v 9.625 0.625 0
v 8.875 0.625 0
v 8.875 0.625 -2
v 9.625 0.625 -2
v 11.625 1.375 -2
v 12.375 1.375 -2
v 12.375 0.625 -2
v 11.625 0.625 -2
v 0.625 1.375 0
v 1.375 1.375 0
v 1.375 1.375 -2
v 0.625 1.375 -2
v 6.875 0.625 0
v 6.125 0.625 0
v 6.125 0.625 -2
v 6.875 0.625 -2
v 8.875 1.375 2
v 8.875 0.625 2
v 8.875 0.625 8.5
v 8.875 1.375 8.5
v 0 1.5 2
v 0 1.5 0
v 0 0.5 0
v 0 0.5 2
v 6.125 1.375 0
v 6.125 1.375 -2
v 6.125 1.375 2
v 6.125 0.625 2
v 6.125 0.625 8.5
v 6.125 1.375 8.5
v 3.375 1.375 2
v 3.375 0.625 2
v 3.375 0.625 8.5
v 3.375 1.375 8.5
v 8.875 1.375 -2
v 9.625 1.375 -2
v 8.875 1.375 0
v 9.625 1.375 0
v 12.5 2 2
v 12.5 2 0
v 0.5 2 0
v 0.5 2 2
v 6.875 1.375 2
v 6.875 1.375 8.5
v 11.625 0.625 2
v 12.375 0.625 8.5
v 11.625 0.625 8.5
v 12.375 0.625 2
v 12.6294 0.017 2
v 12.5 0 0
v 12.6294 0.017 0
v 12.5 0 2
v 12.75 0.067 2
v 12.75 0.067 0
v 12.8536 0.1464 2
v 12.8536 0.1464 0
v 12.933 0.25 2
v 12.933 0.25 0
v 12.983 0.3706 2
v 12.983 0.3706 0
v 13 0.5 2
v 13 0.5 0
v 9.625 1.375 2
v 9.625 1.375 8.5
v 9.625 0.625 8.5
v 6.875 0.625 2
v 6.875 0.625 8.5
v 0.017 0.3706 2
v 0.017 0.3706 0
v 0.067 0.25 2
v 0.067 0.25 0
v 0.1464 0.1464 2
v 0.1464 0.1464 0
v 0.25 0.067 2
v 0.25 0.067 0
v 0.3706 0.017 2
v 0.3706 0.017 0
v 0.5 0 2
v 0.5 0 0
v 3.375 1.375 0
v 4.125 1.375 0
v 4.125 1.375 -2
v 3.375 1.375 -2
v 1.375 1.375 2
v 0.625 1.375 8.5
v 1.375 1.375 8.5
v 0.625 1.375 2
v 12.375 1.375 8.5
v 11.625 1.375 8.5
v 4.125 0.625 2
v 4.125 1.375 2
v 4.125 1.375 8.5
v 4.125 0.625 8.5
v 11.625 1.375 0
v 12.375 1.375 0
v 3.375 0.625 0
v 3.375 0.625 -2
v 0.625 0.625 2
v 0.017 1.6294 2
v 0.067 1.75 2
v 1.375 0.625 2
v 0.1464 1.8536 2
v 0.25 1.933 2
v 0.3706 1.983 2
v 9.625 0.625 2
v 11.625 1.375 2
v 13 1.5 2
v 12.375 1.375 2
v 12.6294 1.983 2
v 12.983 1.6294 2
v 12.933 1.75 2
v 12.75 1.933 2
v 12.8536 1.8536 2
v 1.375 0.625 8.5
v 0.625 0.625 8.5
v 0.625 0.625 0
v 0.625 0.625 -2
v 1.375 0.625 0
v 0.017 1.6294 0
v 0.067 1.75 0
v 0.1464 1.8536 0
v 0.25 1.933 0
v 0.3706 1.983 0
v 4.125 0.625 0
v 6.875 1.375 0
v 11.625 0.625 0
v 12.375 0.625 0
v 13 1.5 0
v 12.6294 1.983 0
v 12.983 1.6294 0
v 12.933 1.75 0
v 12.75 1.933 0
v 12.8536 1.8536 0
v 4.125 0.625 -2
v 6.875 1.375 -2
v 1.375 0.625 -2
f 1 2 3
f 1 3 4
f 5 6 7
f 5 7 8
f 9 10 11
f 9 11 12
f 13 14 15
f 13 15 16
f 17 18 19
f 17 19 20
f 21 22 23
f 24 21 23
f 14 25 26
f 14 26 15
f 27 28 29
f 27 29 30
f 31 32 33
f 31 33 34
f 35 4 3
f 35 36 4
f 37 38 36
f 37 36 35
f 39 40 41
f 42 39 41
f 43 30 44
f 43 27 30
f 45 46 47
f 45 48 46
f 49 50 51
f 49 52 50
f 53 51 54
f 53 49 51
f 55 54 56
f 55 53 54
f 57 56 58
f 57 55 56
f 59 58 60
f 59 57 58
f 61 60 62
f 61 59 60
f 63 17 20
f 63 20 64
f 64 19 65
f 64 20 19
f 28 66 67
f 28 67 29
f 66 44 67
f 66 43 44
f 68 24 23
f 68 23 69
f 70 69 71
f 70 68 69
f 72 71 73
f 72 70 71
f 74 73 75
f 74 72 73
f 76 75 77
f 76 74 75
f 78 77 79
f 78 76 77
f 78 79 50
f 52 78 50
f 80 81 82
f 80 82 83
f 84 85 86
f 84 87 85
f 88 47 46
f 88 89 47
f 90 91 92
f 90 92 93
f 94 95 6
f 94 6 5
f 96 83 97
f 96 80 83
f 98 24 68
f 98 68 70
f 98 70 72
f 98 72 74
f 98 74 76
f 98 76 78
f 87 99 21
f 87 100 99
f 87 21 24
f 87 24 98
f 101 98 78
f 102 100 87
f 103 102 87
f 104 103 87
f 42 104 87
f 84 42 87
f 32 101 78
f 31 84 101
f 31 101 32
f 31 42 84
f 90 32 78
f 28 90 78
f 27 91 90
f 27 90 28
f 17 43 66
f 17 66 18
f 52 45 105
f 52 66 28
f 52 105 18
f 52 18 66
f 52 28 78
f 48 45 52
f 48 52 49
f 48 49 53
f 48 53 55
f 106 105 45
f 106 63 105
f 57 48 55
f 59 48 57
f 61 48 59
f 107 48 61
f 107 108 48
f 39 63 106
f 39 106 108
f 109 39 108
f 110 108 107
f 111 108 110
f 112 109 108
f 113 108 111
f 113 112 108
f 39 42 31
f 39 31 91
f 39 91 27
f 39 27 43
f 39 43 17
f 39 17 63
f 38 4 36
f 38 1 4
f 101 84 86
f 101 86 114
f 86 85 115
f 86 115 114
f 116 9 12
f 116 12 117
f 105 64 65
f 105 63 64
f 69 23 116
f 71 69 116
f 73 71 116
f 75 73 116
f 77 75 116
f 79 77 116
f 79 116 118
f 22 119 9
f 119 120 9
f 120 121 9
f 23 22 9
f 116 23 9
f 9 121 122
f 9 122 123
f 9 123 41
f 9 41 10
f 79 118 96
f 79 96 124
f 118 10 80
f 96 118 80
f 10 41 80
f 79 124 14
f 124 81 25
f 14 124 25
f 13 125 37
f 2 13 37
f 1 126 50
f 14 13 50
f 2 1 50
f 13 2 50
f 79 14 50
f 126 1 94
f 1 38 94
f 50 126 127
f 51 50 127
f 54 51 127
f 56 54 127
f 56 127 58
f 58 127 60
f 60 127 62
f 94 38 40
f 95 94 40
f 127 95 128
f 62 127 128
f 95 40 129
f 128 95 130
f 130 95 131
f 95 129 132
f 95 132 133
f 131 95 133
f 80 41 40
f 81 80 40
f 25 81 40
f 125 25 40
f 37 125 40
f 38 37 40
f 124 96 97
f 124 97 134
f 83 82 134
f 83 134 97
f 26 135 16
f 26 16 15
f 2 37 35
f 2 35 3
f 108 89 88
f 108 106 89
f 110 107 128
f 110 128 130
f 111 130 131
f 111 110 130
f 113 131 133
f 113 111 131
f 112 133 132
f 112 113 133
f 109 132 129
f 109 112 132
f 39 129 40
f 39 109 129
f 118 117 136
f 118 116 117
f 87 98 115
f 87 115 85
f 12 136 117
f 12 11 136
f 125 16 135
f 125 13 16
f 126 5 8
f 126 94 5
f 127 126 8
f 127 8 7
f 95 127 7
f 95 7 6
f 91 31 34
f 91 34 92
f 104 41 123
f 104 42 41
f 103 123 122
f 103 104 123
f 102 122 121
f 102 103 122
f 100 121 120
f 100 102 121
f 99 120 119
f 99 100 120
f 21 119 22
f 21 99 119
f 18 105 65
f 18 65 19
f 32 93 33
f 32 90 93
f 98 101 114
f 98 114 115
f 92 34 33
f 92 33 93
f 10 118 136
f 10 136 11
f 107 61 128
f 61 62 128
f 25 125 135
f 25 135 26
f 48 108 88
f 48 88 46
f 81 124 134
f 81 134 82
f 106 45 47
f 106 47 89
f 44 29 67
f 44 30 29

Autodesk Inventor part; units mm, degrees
ref_plane "YZ Plane" through (0, 0, 0) normal (1, 0, 0) x (0, 1, 0)
ref_plane "XZ Plane" through (0, 0, 0) normal (0, 1, 0) x (-1, 0, 0)
ref_plane "XY Plane" through (0, 0, 0) normal (0, 0, 1) x (1, 0, 0)
sketch "Skizze1" plane through (0, 0, 0) normal (0, 0, 1) x (1, 0, 0)
  line L0 (0, 0) -> (13, 0)
  line L1 (13, 0) -> (13, 2)
  line L2 (13, 2) -> (0, 2)
  line L3 (0, 2) -> (0, 0)
  dimension "d0" = 13
  dimension "d1" = 2
extrude "Extrusion1" add sketch "Skizze1" along normal blind 2
sketch "Skizze2" plane through (0, 0, 2) normal (0, 0, 1) x (1, 0, 0)
  line L0 (6.125, 1.375) -> (6.875, 1.375)
  line L1 (6.875, 1.375) -> (6.875, 0.625)
  line L2 (6.875, 0.625) -> (6.125, 0.625)
  line L3 (6.125, 0.625) -> (6.125, 1.375)
  line L4 (13, 2) -> (0, 2) construction
  line L5 (6.5, 2) -> (6.5, 0) construction
  line L6 (0, 0) -> (13, 0) construction
  line L7 (0, 2) -> (0, 0) construction
  line L8 (0, 1) -> (13, 1) construction
  line L9 (13, 0) -> (13, 2) construction
  line L10 (8.875, 1.375) -> (9.625, 1.375)
  line L11 (8.875, 0.625) -> (8.875, 1.375)
  line L12 (9.625, 0.625) -> (8.875, 0.625)
  line L13 (9.625, 1.375) -> (9.625, 0.625)
  line L14 (11.625, 1.375) -> (12.375, 1.375)
  line L15 (11.625, 0.625) -> (11.625, 1.375)
  line L16 (12.375, 0.625) -> (11.625, 0.625)
  line L17 (12.375, 1.375) -> (12.375, 0.625)
  line L18 (3.375, 1.375) -> (4.125, 1.375)
  line L19 (3.375, 0.625) -> (3.375, 1.375)
  line L20 (4.125, 0.625) -> (3.375, 0.625)
  line L21 (4.125, 1.375) -> (4.125, 0.625)
  line L22 (6.125, 1.375) -> (6.875, 1.375)
  line L23 (6.125, 0.625) -> (6.125, 1.375)
  line L24 (6.875, 0.625) -> (6.125, 0.625)
  line L25 (6.875, 1.375) -> (6.875, 0.625)
  line L26 (8.875, 1.375) -> (9.625, 1.375)
  line L27 (8.875, 0.625) -> (8.875, 1.375)
  line L28 (9.625, 0.625) -> (8.875, 0.625)
  line L29 (9.625, 1.375) -> (9.625, 0.625)
  line L30 (0.625, 1.375) -> (1.375, 1.375)
  line L31 (0.625, 0.625) -> (0.625, 1.375)
  line L32 (1.375, 0.625) -> (0.625, 0.625)
  line L33 (1.375, 1.375) -> (1.375, 0.625)
  line L34 (3.375, 1.375) -> (4.125, 1.375)
  line L35 (3.375, 0.625) -> (3.375, 1.375)
  line L36 (4.125, 0.625) -> (3.375, 0.625)
  line L37 (4.125, 1.375) -> (4.125, 0.625)
  line L38 (6.125, 1.375) -> (6.875, 1.375)
  line L39 (6.125, 0.625) -> (6.125, 1.375)
  line L40 (6.875, 0.625) -> (6.125, 0.625)
  line L41 (6.875, 1.375) -> (6.875, 0.625)
  point P0 (6.5, 1.375)
  point P1 (6.125, 1)
  point P2 (9.25, 1.375)
  point P3 (8.875, 1)
  point P4 (12, 1.375)
  point P5 (11.625, 1)
  point P6 (3.75, 1.375)
  point P7 (3.375, 1)
  point P8 (6.5, 1.375)
  point P9 (6.125, 1)
  point P10 (9.25, 1.375)
  point P11 (8.875, 1)
  point P12 (1, 1.375)
  point P13 (0.625, 1)
  point P14 (3.75, 1.375)
  point P15 (3.375, 1)
  point P16 (6.5, 1.375)
  point P17 (6.125, 1)
  dimension "d4" = 0.75
  dimension "d7" = 2.75
  dimension "d10" = 2.75
extrude "Extrusion2" add sketch "Skizze2" along normal blind 6.5
sketch "Skizze3" plane through (0, 0, 0) normal (0, 0, -1) x (-1, 0, 0)
  line L0 (-1.375, 1.375) -> (-0.625, 1.375) projected
  line L1 (-0.625, 1.375) -> (-0.625, 0.625) projected
  line L2 (-0.625, 0.625) -> (-1.375, 0.625) projected
  line L3 (-1.375, 0.625) -> (-1.375, 1.375) projected
  line L4 (-4.125, 1.375) -> (-3.375, 1.375) projected
  line L5 (-3.375, 1.375) -> (-3.375, 0.625) projected
  line L6 (-3.375, 0.625) -> (-4.125, 0.625) projected
  line L7 (-4.125, 0.625) -> (-4.125, 1.375) projected
  line L8 (-6.875, 1.375) -> (-6.125, 1.375) projected
  line L9 (-6.125, 1.375) -> (-6.125, 0.625) projected
  line L10 (-6.125, 0.625) -> (-6.875, 0.625) projected
  line L11 (-6.875, 0.625) -> (-6.875, 1.375) projected
  line L12 (-9.625, 0.625) -> (-9.625, 1.375) projected
  line L13 (-9.625, 1.375) -> (-8.875, 1.375) projected
  line L14 (-8.875, 1.375) -> (-8.875, 0.625) projected
  line L15 (-8.875, 0.625) -> (-9.625, 0.625) projected
  line L16 (-9.625, 0.625) -> (-9.625, 1.375) projected
  line L17 (-12.375, 1.375) -> (-11.625, 1.375) projected
  line L18 (-11.625, 1.375) -> (-11.625, 0.625) projected
  line L19 (-11.625, 0.625) -> (-12.375, 0.625) projected
  line L20 (-12.375, 0.625) -> (-12.375, 1.375) projected
  point P0 (0, 0)
extrude "Extrusion3" add sketch "Skizze3" along normal blind 2
fillet "Rundung1" radius 0.5 4 edges at (0, 0, 1) (0, 2, 1) (13, 0, 1) (13, 2, 1)
properties part number "Pinhead 5"
